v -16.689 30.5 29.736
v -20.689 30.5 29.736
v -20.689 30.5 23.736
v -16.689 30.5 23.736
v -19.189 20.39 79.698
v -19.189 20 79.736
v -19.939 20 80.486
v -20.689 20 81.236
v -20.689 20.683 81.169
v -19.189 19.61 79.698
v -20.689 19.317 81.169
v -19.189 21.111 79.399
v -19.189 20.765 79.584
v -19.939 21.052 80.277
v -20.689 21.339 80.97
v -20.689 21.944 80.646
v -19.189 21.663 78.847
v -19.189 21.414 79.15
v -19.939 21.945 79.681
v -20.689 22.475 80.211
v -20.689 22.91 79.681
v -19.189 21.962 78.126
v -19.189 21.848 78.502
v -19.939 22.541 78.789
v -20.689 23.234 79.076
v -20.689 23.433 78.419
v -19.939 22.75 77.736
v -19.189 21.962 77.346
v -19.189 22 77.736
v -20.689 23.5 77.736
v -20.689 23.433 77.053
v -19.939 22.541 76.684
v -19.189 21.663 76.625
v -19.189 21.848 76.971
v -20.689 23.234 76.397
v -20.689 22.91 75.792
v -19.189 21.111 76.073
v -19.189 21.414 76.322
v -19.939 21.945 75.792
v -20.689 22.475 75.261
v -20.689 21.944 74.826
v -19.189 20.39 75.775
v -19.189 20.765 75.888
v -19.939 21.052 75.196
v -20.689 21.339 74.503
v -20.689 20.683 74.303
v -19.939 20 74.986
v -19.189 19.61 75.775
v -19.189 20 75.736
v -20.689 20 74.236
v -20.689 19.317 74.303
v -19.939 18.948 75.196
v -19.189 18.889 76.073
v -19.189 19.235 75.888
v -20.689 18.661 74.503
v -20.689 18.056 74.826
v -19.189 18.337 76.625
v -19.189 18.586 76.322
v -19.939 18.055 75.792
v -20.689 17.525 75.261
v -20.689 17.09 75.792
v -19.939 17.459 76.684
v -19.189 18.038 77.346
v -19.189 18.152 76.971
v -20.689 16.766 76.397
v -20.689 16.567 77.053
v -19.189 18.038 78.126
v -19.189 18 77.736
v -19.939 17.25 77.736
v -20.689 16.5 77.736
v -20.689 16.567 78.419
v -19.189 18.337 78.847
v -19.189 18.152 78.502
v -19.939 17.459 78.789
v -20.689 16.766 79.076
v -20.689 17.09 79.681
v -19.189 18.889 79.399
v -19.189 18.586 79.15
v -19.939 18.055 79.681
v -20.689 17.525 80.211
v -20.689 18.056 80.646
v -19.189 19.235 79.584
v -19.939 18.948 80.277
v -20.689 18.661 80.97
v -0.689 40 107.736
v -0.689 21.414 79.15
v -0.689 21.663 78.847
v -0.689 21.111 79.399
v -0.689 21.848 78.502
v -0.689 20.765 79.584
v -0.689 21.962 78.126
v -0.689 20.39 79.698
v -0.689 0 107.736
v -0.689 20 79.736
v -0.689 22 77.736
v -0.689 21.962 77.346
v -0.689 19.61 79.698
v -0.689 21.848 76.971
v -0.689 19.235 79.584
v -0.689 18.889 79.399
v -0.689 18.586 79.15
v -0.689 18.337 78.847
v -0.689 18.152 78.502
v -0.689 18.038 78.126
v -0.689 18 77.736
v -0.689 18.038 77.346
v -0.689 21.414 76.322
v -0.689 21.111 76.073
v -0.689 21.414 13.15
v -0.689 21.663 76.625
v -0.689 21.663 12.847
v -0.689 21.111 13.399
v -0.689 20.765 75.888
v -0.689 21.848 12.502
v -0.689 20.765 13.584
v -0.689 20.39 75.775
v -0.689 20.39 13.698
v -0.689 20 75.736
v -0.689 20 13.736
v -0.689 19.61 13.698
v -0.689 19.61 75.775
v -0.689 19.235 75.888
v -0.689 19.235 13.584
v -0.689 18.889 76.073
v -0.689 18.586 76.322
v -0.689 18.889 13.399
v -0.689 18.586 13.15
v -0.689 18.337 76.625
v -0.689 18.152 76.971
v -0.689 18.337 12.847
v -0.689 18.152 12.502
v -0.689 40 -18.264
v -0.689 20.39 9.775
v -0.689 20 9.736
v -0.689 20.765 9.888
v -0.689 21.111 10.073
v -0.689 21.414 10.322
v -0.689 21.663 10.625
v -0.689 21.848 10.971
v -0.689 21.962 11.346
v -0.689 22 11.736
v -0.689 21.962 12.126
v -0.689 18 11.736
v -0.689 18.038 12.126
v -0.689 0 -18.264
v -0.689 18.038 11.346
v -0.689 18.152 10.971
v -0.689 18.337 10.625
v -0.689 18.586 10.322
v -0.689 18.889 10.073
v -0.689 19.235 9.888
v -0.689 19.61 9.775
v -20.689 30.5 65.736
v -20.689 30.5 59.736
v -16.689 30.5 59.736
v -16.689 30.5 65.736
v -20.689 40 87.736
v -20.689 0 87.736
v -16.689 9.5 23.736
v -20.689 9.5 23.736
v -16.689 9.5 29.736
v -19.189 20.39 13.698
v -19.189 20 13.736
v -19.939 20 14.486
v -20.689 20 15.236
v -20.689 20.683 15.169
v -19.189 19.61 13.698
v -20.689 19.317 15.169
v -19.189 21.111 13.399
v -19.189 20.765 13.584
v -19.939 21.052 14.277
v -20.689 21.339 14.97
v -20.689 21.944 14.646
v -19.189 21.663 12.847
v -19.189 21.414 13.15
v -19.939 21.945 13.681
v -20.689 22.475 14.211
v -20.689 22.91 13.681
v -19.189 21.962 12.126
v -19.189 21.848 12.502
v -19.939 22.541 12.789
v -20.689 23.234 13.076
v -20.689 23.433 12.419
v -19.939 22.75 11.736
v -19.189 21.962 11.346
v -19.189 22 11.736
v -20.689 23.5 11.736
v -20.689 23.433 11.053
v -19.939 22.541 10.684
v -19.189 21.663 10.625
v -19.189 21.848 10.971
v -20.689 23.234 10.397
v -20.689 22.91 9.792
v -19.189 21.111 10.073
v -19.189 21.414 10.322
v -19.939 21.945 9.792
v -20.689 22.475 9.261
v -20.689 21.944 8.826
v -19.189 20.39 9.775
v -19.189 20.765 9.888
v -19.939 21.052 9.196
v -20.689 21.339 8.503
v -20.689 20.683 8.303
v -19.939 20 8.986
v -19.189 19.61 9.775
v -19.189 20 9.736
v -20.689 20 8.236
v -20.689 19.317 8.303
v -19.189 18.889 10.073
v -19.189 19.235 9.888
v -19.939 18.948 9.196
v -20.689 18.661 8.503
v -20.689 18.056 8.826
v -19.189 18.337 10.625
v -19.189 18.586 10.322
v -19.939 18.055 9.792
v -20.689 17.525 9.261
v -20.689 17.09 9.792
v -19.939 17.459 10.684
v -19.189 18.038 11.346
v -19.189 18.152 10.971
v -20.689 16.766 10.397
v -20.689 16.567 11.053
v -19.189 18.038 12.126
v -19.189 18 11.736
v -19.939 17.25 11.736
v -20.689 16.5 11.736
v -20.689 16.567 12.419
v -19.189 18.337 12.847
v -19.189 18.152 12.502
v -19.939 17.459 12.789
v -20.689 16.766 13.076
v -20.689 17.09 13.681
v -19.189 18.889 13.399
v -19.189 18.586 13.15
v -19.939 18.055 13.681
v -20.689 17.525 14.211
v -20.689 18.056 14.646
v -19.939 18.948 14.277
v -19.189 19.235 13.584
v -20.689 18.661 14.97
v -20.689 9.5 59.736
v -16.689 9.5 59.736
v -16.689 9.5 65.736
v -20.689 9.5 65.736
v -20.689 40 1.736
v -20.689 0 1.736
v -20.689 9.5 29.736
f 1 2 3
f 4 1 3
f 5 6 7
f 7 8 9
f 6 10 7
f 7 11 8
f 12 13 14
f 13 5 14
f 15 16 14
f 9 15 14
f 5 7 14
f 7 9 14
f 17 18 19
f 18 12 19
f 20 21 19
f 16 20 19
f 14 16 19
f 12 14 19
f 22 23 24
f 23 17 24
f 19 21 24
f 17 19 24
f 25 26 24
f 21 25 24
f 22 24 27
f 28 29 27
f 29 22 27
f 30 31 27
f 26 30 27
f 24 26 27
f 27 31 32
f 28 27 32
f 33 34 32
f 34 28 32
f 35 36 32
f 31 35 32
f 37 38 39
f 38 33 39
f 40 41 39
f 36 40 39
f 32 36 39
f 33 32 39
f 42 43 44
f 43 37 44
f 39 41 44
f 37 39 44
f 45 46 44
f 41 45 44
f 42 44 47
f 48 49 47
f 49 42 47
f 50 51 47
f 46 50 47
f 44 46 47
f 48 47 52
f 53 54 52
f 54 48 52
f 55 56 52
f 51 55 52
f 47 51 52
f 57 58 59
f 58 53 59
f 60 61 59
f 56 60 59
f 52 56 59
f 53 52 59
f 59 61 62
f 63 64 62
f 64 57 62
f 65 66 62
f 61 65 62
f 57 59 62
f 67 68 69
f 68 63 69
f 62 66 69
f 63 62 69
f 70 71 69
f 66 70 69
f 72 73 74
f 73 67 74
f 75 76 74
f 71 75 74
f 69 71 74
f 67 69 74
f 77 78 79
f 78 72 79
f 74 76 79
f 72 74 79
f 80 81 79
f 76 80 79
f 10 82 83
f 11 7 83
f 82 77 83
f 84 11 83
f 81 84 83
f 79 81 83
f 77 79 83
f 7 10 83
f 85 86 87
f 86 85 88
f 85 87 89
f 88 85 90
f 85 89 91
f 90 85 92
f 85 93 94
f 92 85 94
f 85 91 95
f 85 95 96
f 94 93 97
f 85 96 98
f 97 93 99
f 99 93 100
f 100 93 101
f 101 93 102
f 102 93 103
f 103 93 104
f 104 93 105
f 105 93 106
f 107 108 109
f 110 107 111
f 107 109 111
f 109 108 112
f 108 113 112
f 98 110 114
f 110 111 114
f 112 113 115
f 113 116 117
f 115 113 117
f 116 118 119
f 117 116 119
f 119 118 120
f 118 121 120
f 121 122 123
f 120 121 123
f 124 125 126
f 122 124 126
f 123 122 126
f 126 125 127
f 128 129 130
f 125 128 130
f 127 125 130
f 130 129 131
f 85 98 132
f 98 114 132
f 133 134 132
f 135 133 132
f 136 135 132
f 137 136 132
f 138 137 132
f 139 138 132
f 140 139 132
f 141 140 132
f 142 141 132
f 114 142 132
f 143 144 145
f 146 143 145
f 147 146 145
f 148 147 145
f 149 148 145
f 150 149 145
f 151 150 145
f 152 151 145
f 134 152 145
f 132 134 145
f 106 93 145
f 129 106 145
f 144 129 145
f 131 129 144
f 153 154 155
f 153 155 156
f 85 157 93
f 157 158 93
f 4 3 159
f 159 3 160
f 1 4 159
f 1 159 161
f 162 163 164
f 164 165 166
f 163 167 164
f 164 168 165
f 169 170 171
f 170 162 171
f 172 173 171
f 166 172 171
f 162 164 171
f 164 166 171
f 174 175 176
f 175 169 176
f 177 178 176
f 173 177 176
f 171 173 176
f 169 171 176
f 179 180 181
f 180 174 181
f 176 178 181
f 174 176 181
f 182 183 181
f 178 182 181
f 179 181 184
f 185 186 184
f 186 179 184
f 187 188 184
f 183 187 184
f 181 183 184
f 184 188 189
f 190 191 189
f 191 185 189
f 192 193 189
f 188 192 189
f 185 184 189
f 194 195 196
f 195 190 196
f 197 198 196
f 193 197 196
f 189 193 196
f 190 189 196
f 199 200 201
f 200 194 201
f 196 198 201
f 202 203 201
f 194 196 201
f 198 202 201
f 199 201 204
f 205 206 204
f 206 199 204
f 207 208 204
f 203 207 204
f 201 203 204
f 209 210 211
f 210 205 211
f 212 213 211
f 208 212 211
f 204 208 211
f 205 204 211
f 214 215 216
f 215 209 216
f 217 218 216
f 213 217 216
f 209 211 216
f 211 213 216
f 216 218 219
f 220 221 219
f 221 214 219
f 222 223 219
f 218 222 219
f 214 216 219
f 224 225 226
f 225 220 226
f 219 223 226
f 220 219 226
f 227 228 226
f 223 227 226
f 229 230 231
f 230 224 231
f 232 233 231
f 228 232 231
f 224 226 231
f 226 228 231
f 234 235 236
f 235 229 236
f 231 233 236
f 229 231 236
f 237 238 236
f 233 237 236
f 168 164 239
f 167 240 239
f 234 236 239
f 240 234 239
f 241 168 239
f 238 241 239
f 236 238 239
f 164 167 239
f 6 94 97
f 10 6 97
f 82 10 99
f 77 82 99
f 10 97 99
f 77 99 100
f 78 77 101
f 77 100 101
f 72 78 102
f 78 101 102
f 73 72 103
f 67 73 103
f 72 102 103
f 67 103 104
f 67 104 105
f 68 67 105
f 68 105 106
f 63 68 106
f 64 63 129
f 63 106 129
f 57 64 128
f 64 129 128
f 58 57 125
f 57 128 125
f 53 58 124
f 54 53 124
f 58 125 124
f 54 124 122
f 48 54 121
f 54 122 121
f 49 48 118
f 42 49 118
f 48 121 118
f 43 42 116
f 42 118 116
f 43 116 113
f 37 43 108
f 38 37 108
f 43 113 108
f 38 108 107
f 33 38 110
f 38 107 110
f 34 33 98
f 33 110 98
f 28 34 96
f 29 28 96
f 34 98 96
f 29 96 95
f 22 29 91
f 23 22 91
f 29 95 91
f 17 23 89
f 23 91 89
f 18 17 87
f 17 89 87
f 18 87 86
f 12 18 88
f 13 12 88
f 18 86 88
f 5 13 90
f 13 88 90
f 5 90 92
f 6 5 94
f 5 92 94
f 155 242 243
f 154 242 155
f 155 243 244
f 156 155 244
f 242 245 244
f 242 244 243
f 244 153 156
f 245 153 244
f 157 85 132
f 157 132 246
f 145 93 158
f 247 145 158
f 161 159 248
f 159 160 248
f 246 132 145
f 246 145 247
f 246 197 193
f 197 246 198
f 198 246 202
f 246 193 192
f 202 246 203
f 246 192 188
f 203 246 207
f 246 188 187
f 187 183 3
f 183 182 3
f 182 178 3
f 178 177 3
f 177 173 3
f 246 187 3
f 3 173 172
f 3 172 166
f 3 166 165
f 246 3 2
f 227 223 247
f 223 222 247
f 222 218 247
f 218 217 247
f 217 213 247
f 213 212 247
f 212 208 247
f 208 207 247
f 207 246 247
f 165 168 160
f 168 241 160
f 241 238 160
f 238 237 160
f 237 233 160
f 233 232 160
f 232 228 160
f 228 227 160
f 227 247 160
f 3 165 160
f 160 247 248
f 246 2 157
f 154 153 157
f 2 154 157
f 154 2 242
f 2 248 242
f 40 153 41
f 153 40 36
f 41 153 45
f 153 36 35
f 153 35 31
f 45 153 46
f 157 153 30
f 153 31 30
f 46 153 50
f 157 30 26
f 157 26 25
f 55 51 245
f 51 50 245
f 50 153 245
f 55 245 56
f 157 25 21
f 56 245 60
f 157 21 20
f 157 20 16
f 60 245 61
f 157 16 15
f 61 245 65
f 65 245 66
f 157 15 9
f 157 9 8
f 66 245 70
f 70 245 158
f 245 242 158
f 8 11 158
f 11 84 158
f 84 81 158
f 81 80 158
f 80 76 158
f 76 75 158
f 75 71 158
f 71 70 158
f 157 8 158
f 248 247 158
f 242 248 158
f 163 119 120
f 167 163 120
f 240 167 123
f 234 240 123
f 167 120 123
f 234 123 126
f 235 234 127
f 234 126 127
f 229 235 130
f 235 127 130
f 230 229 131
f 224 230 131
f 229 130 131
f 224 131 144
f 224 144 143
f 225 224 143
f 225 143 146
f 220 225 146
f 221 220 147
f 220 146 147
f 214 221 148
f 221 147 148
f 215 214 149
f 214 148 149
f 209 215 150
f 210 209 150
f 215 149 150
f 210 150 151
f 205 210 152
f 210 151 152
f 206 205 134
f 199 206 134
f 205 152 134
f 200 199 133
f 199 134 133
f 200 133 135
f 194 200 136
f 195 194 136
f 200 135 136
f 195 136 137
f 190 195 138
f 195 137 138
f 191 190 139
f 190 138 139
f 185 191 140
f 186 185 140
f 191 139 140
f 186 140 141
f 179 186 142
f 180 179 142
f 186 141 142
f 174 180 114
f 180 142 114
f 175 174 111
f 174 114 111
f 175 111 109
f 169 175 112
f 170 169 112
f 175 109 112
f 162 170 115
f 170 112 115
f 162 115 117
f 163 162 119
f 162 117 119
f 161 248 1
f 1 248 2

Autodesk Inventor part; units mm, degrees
ref_plane "YZ Plane" through (0, 0, 0) normal (1, 0, 0) x (0, 1, 0)
ref_plane "XZ Plane" through (0, 0, 0) normal (0, 1, 0) x (-1, 0, 0)
ref_plane "XY Plane" through (0, 0, 0) normal (0, 0, 1) x (1, 0, 0)
sketch "Sketch1" plane through (0, 0, 0) normal (0, 1, 0) x (-1, 0, 0)
  line L0 (0.6887, 107.7362) -> (0.6887, -18.2638)
  line L1 (0.6887, -18.2638) -> (20.6887, 1.7362)
  line L2 (20.6887, 1.7362) -> (20.6887, 87.7362)
  line L3 (20.6887, 87.7362) -> (0.6887, 107.7362)
  point P0 (0, 0)
  dimension "d0" = 45
  dimension "d1" = 86
  dimension "d3" = 20
  dimension "d4" = 126
extrude "Extrusion1" add sketch "Sketch1" along normal blind 40
sketch "Sketch2" plane through (-20.6887, 0, 1.7362) normal (-1, 0, 0) x (0, 0, 1)
  line L0 (0, 0) -> (0, 40) construction
  line L1 (0, 20) -> (86, 20) construction
  line L2 (86, 0) -> (86, 40) construction
  line L3 (-20, 0) -> (-20, 40) construction
  line L4 (10, 20) -> (-20, 20) construction
  line L5 (76, 20) -> (106, 20) construction
  line L6 (106, 0) -> (106, 40) construction
  line L7 (22, 9.5) -> (28, 9.5)
  line L8 (28, 9.5) -> (28, 30.5)
  line L9 (28, 30.5) -> (22, 30.5)
  line L10 (22, 30.5) -> (22, 9.5)
  line L11 (43, 20) -> (43, 31.7658) construction
  line L12 (64, 9.5) -> (58, 9.5)
  line L13 (58, 9.5) -> (58, 30.5)
  line L14 (58, 30.5) -> (64, 30.5)
  line L15 (64, 30.5) -> (64, 9.5)
  point P0 (-1.7362, 0)
  point P1 (22, 20)
  dimension "d7" = 30
  dimension "d8" = 5
  dimension "d9" = 20
  dimension "d10" = 15
extrude "Extrusion2" cut sketch "Sketch2" against normal blind 4
hole "Hole1" at (-20.6887, 20, 11.7362) at (-20.6887, 20, 77.7362) direction (1, 0, 0) diameter 4 end through all countersink diameter 7 countersink angle 90
equation "\"d1\" = outer_carriage_innside_length"
equation "\"d3\" = outer_carriage_width"
equation "\"d5\" = outer_carriage_height"
equation "\"d7\" = outer_carriage_corner_to_screw"
equation "\"d8\" = glide_plate_width"
equation "\"d9\" = glide_plate_length"
equation "\"d10\" = outer_carriage_center_to_glideplate"
equation "\"d11\" = glide_plate_height - outer_carriage_to_centerlegg"
equation "\"d13\" = outer_carriage_screw_size"
equation "\"outer_carriage_length\" = d4"
equation "\"outer_carriage_height\" = 40"
equation "\"outer_carriage_width\" = 20"
equation "\"outer_carriage_screw_size\" = 4"
equation "\"outer_carriage_innside_length\" = long_centerlegg_width + 2 * outer_carriage_to_centerlegg"
equation "\"outer_carriage_center_to_glideplate\" = 15"
equation "\"outer_carriage_to_centerlegg\" = 1"
equation "\"outer_carriage_corner_to_screw\" = 30"
equation "\"glide_plate_width\" = 5"
equation "\"glide_plate_length\" = 20"
equation "\"glide_plate_height\" = 5"
equation "\"long_centerlegg_width\" = 84"
properties part number "01_one_side_base_model"
